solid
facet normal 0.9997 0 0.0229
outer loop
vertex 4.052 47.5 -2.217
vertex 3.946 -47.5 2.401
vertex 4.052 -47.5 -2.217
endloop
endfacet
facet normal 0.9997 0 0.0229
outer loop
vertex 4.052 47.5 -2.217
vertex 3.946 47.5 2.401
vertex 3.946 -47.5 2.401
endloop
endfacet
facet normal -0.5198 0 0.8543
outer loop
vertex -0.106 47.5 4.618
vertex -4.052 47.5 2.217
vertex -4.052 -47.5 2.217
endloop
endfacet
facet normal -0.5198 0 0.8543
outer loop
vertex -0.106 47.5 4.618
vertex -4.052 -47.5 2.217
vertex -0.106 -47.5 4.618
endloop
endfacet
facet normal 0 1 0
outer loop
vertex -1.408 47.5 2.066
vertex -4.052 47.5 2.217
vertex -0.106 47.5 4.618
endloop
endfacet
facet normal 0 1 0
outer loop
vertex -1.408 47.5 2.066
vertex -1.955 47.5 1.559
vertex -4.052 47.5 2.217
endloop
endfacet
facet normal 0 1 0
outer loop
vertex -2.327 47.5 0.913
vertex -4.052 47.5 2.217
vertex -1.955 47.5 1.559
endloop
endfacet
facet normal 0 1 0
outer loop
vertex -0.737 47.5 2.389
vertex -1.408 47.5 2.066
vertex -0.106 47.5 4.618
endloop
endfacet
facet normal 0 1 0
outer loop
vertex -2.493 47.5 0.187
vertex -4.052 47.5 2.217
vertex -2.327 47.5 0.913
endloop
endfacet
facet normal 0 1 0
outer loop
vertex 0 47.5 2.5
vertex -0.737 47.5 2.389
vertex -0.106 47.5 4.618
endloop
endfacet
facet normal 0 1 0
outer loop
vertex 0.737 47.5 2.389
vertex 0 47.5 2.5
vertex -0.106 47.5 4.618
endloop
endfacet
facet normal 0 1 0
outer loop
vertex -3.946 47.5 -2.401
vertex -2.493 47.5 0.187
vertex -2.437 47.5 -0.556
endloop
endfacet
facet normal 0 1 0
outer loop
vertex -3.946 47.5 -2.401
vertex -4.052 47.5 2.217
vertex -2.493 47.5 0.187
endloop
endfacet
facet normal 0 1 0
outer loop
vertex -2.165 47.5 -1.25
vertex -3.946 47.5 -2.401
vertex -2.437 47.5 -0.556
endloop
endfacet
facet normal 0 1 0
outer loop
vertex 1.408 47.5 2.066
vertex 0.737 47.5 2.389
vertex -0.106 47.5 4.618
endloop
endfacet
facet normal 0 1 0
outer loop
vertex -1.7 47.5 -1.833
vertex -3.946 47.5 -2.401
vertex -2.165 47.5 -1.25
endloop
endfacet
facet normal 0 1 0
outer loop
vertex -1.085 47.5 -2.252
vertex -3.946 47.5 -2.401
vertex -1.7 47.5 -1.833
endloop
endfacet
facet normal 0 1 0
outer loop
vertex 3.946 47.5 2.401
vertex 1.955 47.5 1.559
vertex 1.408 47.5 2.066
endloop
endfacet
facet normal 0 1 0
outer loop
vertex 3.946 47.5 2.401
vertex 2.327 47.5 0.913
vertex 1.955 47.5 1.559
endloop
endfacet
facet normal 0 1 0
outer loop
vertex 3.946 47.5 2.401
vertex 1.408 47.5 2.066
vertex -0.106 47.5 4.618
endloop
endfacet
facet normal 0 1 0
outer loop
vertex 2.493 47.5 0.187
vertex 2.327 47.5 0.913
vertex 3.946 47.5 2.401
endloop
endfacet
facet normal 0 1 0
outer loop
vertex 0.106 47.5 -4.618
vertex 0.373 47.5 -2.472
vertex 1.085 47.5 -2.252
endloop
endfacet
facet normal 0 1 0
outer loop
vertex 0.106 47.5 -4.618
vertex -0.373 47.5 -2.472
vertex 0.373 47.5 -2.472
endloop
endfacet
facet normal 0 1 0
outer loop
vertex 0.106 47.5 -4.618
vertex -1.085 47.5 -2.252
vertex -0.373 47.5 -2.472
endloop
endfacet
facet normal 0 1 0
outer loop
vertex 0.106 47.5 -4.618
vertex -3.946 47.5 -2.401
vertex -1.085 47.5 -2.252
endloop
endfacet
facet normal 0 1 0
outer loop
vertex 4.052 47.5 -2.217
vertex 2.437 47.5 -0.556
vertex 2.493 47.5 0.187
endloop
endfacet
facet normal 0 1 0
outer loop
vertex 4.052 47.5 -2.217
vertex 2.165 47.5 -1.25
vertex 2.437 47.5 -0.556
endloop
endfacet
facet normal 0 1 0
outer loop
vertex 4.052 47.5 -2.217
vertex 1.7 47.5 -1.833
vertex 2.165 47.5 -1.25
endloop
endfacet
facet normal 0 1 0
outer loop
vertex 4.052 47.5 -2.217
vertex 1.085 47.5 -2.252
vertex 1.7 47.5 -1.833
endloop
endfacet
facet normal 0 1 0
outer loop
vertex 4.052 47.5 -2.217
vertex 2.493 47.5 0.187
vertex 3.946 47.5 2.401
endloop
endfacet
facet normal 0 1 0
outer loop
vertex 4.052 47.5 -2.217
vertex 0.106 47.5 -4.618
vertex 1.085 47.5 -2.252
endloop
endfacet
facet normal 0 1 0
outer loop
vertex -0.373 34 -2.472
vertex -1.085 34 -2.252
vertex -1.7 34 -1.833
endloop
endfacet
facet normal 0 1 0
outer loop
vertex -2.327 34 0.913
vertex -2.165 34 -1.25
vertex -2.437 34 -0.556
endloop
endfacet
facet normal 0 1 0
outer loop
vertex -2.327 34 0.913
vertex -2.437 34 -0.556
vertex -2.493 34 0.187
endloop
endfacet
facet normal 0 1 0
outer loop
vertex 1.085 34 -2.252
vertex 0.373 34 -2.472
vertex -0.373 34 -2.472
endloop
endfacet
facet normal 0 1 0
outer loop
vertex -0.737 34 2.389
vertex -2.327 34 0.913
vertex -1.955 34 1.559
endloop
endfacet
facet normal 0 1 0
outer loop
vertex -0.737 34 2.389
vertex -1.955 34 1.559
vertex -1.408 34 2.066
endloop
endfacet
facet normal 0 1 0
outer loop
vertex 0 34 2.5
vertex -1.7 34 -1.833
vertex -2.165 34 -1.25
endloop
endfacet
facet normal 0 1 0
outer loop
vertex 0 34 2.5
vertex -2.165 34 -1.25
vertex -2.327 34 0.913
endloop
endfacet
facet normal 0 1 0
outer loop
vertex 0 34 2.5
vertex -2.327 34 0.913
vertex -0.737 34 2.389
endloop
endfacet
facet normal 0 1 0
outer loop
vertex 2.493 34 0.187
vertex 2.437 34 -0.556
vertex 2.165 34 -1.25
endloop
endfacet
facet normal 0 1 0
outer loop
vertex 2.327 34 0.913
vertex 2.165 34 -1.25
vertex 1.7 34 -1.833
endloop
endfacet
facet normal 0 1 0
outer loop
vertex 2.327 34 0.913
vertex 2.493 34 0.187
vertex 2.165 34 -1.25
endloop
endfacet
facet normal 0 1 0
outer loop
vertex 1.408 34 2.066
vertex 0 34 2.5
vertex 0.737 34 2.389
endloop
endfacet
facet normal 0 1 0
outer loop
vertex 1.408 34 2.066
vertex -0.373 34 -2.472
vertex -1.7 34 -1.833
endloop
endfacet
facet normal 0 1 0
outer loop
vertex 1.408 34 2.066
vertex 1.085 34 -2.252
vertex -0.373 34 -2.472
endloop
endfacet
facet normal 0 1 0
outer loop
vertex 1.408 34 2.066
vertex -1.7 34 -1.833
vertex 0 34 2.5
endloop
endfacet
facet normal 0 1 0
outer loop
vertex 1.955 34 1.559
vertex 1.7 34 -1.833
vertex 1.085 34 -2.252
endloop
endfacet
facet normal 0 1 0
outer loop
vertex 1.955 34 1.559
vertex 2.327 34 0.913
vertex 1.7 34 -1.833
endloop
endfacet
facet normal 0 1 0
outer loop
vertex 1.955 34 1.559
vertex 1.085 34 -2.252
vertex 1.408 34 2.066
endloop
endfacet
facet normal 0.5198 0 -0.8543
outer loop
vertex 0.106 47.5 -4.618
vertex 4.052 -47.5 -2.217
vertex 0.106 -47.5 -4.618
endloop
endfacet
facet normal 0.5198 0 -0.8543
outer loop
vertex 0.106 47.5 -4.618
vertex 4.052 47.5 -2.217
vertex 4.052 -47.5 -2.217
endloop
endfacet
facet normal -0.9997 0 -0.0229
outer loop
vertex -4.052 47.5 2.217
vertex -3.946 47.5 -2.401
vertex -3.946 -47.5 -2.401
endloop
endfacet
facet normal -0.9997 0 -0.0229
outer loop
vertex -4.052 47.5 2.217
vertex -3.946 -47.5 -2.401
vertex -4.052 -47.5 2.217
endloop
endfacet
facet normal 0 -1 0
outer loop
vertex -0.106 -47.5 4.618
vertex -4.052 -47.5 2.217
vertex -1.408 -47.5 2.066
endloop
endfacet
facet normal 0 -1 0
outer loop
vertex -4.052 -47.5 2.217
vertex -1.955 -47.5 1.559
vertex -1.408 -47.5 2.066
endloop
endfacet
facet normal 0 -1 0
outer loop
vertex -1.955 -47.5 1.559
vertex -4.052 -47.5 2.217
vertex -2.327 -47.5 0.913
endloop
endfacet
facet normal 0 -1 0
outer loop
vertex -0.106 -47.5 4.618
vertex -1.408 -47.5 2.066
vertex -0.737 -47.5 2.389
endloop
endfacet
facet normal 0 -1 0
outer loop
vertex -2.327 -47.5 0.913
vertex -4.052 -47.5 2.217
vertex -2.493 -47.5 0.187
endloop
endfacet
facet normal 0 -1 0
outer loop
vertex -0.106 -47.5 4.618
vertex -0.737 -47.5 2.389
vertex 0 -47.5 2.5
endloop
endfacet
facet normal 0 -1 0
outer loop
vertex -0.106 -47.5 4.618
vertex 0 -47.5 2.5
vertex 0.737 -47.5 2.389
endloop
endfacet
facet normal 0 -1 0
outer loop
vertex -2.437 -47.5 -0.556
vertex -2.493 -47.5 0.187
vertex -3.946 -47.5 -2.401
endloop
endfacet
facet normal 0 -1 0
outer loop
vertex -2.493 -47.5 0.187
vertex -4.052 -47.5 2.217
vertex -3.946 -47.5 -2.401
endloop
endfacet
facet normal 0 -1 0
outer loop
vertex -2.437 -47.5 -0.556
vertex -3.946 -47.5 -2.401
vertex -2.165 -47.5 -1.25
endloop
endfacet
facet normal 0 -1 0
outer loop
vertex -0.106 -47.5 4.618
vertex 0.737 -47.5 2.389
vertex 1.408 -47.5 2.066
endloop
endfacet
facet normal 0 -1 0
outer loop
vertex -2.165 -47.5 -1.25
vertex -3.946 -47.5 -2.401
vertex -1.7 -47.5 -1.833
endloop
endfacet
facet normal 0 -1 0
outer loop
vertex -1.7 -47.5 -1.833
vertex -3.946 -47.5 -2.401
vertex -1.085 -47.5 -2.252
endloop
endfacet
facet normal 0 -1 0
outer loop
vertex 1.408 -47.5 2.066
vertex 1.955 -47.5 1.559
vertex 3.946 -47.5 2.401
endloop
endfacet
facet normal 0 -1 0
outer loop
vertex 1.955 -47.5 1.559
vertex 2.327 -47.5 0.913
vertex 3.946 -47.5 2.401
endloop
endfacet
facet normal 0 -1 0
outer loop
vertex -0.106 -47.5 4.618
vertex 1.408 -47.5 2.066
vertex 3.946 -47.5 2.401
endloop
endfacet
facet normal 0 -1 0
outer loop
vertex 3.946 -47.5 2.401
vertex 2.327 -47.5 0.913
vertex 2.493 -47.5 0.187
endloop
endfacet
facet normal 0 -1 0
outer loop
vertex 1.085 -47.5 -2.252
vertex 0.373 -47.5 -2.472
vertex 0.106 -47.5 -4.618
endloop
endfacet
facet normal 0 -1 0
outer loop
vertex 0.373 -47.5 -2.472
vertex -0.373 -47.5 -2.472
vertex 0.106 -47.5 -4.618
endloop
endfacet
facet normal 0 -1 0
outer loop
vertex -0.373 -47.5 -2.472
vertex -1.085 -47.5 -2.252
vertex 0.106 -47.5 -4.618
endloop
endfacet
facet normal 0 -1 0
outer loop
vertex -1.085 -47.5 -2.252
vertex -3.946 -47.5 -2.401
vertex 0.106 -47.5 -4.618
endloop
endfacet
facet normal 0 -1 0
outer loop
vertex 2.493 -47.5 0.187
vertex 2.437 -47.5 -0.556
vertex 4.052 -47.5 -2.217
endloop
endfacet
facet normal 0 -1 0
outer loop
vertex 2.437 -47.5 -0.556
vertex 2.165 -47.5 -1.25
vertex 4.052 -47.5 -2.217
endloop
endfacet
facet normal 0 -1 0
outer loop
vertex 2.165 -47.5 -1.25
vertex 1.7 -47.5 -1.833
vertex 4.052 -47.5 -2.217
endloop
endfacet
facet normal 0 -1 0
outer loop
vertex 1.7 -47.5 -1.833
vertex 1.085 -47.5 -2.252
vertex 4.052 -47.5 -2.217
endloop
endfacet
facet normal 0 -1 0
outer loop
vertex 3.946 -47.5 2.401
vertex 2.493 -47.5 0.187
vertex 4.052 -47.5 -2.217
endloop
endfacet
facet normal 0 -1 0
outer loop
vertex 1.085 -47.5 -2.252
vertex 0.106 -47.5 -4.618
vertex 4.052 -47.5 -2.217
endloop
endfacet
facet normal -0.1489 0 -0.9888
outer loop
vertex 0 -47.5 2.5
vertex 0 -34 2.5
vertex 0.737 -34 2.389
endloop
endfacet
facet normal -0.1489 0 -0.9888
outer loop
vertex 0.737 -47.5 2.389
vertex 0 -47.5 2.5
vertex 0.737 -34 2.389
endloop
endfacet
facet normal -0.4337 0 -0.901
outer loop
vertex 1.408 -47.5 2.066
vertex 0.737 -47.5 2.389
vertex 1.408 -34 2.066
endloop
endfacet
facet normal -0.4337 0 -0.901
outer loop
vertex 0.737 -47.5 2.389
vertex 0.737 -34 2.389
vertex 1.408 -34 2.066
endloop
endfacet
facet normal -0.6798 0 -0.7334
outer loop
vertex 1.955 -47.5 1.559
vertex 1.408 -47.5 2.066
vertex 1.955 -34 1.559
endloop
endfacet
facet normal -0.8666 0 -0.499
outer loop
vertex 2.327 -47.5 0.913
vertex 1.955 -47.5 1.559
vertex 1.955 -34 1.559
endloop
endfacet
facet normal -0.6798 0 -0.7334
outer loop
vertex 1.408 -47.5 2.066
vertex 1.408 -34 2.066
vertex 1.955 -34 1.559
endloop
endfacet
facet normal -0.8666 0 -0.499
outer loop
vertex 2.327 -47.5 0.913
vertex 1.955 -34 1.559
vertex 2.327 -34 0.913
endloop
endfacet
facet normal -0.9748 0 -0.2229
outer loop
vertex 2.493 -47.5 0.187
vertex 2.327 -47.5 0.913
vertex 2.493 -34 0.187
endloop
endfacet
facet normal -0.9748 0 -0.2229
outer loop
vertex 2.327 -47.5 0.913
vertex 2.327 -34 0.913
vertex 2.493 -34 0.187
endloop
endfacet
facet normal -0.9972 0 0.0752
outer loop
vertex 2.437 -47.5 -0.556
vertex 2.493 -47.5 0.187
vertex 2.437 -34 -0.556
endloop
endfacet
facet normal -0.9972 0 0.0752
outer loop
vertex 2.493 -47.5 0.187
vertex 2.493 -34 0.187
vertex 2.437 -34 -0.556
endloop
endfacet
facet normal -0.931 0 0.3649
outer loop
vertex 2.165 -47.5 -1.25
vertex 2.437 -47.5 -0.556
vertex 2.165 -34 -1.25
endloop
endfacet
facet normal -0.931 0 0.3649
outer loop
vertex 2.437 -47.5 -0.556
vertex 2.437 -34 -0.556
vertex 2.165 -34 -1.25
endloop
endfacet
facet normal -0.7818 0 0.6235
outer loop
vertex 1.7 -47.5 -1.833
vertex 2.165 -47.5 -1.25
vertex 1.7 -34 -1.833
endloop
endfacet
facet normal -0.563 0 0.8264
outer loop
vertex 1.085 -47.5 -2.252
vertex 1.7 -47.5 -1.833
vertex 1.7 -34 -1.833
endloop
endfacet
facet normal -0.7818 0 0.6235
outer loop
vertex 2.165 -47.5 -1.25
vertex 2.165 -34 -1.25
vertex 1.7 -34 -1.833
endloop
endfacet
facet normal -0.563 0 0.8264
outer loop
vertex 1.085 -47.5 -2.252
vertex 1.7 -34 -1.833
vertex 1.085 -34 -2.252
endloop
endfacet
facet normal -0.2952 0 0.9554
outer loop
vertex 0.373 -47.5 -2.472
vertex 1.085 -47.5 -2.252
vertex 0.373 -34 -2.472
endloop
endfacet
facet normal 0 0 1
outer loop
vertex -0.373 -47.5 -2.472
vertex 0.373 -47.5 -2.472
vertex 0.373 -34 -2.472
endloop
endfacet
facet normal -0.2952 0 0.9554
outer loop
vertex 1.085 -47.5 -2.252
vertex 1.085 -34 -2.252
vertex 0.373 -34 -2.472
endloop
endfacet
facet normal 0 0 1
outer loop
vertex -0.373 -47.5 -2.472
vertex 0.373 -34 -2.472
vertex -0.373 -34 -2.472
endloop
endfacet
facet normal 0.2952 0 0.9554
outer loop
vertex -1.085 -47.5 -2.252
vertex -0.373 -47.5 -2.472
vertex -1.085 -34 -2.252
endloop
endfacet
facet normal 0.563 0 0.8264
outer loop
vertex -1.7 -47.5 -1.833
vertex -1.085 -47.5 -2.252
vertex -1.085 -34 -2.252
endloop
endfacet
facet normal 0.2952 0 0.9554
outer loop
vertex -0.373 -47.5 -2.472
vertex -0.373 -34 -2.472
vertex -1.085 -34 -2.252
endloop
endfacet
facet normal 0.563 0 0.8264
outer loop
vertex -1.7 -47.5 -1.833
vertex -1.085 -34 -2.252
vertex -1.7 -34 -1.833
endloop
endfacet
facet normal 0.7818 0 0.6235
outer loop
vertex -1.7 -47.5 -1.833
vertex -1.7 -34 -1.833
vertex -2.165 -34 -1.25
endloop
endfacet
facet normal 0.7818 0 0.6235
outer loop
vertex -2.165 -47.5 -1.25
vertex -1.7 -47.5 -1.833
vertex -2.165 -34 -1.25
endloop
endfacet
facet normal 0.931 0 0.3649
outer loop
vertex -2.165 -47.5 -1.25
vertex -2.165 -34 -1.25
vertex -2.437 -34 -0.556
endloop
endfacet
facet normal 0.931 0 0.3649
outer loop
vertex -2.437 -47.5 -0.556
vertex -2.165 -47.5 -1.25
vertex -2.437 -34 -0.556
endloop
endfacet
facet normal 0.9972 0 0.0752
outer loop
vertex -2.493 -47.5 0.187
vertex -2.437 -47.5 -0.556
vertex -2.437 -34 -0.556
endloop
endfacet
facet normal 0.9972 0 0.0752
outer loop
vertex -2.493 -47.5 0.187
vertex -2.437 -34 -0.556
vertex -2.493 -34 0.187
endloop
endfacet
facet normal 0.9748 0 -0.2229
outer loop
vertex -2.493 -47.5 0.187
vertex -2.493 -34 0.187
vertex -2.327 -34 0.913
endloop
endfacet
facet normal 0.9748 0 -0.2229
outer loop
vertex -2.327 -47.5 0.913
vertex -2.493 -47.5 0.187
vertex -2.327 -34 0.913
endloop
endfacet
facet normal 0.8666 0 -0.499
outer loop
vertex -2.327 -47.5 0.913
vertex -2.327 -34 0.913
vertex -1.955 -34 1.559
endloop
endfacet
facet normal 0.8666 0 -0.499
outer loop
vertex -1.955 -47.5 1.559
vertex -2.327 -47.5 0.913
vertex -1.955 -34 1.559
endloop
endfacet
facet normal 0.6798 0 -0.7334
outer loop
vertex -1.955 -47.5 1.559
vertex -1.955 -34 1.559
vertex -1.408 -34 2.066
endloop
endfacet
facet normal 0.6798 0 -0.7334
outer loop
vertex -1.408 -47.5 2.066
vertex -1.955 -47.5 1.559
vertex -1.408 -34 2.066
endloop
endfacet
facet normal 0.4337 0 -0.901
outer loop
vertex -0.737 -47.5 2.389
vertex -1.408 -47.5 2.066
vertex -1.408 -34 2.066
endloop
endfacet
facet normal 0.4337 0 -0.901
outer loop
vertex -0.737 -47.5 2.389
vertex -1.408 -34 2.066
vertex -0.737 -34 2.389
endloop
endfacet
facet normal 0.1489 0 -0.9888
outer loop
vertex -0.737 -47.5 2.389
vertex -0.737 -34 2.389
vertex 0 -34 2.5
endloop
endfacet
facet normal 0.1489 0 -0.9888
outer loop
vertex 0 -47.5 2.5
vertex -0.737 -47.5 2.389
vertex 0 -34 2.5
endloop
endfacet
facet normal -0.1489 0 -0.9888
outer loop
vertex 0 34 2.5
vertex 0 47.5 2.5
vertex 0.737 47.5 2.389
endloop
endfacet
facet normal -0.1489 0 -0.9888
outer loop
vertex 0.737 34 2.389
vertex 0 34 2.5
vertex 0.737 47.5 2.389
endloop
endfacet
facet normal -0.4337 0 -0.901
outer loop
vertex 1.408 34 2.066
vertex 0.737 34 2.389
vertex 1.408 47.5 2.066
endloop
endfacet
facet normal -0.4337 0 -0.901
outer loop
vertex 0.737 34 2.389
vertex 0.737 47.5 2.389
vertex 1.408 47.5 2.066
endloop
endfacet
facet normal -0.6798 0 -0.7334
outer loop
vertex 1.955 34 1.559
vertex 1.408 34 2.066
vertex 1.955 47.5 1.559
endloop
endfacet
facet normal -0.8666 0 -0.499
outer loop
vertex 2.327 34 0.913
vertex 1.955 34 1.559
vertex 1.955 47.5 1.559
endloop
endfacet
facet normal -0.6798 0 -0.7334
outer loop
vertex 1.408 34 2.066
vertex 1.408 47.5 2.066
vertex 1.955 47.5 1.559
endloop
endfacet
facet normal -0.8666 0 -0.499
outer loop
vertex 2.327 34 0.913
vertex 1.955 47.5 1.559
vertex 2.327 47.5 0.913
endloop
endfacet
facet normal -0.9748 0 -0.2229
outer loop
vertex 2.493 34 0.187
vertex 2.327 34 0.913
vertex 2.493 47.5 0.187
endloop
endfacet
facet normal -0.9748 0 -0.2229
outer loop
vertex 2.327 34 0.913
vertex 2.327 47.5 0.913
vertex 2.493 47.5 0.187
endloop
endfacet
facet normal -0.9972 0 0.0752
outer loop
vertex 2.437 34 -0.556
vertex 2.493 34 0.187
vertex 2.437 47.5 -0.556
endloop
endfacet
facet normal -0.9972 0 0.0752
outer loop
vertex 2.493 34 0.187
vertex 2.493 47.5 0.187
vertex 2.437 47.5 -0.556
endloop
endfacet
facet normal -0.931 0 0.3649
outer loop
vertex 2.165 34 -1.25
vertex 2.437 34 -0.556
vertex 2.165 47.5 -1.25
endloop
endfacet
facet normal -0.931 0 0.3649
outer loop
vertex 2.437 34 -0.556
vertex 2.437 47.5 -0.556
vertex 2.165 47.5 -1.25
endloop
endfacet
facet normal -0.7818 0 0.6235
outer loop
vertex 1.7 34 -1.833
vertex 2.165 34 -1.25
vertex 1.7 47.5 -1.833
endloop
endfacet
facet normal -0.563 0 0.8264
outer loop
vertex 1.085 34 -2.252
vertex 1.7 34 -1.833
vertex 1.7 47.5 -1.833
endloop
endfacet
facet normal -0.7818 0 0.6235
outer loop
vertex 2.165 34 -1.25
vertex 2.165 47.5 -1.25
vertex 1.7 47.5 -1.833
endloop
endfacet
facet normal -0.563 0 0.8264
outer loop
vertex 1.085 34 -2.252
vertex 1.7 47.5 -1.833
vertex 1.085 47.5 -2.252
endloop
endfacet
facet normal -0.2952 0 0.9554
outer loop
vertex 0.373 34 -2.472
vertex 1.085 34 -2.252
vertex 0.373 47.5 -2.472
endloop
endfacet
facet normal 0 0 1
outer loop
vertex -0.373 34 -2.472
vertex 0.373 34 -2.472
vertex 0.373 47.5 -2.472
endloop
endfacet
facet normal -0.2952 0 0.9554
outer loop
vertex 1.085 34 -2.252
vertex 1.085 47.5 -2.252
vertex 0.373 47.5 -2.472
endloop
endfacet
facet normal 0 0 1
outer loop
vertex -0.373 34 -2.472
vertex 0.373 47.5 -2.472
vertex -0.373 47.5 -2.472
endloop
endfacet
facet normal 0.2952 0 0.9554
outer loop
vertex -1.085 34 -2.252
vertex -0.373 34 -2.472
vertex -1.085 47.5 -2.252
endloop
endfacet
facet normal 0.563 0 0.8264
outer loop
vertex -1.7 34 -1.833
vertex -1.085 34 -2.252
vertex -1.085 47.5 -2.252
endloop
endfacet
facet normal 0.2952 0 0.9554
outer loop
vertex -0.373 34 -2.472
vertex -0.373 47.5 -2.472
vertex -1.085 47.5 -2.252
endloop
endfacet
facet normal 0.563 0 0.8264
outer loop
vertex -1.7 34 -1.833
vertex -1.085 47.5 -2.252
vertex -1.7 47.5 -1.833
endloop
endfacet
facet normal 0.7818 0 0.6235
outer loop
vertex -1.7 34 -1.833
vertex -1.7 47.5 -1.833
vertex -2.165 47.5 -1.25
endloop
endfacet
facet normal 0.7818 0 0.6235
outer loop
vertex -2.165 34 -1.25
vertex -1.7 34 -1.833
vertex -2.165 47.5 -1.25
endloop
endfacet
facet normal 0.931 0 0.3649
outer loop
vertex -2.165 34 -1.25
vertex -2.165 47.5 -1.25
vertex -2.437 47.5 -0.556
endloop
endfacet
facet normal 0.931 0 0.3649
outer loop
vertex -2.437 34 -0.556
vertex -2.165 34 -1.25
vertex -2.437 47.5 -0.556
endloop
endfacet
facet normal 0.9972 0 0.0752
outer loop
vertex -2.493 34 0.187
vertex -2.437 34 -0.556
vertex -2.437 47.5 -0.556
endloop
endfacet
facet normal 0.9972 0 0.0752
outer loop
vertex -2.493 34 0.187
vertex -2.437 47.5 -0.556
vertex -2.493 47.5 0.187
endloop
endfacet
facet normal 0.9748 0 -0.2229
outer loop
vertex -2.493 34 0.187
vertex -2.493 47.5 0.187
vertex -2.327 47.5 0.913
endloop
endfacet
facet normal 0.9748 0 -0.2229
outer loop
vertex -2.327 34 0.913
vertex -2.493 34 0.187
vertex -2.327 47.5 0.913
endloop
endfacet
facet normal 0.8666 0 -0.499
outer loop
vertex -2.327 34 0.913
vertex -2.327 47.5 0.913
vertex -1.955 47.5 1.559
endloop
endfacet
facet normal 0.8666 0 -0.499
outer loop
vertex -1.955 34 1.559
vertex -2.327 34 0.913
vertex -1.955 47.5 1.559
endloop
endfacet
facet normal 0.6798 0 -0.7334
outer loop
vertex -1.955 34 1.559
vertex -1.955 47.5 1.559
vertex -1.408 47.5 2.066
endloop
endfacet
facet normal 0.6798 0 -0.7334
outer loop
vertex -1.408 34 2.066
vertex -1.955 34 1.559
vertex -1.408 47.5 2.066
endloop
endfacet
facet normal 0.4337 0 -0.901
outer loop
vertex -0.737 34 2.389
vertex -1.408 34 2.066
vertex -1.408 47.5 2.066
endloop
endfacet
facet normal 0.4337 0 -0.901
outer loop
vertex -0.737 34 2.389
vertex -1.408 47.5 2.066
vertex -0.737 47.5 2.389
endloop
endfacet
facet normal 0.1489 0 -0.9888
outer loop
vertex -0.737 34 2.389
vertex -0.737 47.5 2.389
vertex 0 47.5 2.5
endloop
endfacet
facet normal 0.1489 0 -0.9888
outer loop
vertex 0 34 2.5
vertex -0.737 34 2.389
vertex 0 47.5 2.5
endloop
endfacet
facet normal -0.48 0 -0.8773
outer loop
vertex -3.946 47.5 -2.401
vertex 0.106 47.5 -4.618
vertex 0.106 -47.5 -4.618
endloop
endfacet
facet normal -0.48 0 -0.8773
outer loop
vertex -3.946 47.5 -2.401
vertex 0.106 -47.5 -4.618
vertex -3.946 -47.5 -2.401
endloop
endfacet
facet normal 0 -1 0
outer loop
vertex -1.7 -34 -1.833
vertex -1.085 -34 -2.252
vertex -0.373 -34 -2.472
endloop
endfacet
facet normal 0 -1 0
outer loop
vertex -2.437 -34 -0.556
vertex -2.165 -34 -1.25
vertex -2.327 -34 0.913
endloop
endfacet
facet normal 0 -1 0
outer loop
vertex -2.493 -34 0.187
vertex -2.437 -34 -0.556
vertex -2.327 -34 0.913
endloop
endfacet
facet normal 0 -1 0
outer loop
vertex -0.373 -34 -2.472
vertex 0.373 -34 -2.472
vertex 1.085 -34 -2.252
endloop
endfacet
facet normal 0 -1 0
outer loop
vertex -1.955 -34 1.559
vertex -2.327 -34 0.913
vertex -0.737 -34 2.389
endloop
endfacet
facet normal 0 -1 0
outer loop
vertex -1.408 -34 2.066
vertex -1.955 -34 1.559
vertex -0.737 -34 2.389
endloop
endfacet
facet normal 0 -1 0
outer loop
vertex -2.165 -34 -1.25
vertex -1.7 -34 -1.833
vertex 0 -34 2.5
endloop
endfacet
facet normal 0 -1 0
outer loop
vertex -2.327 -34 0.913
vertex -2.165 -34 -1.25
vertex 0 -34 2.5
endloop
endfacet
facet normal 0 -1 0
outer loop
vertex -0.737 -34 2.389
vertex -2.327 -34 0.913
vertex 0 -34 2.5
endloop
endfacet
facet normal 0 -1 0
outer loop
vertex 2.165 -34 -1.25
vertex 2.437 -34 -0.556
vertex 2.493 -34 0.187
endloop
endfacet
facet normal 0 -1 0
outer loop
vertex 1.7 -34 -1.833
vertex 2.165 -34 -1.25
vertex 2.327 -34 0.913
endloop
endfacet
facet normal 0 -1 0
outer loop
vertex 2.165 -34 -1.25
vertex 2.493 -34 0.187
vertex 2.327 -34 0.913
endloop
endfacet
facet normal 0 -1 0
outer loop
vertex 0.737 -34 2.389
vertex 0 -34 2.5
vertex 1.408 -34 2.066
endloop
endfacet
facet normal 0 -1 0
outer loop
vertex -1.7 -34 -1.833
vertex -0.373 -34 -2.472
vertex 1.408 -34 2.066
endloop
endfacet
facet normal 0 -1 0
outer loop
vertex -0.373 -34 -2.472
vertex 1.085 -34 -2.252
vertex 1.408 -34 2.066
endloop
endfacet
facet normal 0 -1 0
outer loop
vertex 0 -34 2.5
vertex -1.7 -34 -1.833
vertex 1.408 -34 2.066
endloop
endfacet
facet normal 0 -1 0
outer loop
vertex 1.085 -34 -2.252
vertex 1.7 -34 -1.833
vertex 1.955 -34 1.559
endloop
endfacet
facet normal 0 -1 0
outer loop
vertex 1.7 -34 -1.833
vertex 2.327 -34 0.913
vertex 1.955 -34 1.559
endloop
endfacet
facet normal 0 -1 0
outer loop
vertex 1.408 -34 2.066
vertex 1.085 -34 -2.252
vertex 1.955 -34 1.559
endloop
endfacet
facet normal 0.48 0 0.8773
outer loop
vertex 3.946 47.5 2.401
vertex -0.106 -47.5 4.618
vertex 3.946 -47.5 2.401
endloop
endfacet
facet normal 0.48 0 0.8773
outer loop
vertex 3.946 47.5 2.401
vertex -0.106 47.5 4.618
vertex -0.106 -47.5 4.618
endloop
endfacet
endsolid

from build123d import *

# Parameters (mm, degrees)
BOSS_EXTRUDE1_DEPTH = 47.5
CUT_EXTRUDE1_START  = 48
SKETCH1_3_R         = 2.5
CUT_EXTRUDE1_DEPTH  = 14
CUT_EXTRUDE2_START  = -34
SKETCH1_4_R         = 2.5
CUT_EXTRUDE2_DEPTH  = 14


with BuildPart() as part:
    # Sketch1 → Boss-Extrude1 (new, symmetric)
    with BuildSketch(Plane(origin=(0, 0, 0), x_dir=(1, 0, 0), z_dir=(0, 1, 0))):
        Polygon((4.052090098, 2.216731642), (0.106299134, 4.617578784), (-3.945790964, 2.400847142), (-4.052090098, -2.216731642), (-0.106299134, -4.617578784), (3.945790964, -2.400847142), align=None)
    extrude(amount=BOSS_EXTRUDE1_DEPTH, both=True)

    # Sketch1<3> → Cut-Extrude1 (cut)
    with BuildSketch(Plane(origin=(0, 0, 0), x_dir=(1, 0, 0), z_dir=(0, 1, 0)).offset(CUT_EXTRUDE1_START)):
        with Locations(Location((0, 0, 0), (0, 0, 270))):
            Circle(SKETCH1_3_R)
    extrude(amount=-CUT_EXTRUDE1_DEPTH, mode=Mode.SUBTRACT)

    # Sketch1<4> → Cut-Extrude2 (cut)
    with BuildSketch(Plane(origin=(0, 0, 0), x_dir=(1, 0, 0), z_dir=(0, 1, 0)).offset(CUT_EXTRUDE2_START)):
        with Locations(Location((0, 0, 0), (0, 0, 270))):
            Circle(SKETCH1_4_R)
    extrude(amount=-CUT_EXTRUDE2_DEPTH, mode=Mode.SUBTRACT)


solid = part.part
